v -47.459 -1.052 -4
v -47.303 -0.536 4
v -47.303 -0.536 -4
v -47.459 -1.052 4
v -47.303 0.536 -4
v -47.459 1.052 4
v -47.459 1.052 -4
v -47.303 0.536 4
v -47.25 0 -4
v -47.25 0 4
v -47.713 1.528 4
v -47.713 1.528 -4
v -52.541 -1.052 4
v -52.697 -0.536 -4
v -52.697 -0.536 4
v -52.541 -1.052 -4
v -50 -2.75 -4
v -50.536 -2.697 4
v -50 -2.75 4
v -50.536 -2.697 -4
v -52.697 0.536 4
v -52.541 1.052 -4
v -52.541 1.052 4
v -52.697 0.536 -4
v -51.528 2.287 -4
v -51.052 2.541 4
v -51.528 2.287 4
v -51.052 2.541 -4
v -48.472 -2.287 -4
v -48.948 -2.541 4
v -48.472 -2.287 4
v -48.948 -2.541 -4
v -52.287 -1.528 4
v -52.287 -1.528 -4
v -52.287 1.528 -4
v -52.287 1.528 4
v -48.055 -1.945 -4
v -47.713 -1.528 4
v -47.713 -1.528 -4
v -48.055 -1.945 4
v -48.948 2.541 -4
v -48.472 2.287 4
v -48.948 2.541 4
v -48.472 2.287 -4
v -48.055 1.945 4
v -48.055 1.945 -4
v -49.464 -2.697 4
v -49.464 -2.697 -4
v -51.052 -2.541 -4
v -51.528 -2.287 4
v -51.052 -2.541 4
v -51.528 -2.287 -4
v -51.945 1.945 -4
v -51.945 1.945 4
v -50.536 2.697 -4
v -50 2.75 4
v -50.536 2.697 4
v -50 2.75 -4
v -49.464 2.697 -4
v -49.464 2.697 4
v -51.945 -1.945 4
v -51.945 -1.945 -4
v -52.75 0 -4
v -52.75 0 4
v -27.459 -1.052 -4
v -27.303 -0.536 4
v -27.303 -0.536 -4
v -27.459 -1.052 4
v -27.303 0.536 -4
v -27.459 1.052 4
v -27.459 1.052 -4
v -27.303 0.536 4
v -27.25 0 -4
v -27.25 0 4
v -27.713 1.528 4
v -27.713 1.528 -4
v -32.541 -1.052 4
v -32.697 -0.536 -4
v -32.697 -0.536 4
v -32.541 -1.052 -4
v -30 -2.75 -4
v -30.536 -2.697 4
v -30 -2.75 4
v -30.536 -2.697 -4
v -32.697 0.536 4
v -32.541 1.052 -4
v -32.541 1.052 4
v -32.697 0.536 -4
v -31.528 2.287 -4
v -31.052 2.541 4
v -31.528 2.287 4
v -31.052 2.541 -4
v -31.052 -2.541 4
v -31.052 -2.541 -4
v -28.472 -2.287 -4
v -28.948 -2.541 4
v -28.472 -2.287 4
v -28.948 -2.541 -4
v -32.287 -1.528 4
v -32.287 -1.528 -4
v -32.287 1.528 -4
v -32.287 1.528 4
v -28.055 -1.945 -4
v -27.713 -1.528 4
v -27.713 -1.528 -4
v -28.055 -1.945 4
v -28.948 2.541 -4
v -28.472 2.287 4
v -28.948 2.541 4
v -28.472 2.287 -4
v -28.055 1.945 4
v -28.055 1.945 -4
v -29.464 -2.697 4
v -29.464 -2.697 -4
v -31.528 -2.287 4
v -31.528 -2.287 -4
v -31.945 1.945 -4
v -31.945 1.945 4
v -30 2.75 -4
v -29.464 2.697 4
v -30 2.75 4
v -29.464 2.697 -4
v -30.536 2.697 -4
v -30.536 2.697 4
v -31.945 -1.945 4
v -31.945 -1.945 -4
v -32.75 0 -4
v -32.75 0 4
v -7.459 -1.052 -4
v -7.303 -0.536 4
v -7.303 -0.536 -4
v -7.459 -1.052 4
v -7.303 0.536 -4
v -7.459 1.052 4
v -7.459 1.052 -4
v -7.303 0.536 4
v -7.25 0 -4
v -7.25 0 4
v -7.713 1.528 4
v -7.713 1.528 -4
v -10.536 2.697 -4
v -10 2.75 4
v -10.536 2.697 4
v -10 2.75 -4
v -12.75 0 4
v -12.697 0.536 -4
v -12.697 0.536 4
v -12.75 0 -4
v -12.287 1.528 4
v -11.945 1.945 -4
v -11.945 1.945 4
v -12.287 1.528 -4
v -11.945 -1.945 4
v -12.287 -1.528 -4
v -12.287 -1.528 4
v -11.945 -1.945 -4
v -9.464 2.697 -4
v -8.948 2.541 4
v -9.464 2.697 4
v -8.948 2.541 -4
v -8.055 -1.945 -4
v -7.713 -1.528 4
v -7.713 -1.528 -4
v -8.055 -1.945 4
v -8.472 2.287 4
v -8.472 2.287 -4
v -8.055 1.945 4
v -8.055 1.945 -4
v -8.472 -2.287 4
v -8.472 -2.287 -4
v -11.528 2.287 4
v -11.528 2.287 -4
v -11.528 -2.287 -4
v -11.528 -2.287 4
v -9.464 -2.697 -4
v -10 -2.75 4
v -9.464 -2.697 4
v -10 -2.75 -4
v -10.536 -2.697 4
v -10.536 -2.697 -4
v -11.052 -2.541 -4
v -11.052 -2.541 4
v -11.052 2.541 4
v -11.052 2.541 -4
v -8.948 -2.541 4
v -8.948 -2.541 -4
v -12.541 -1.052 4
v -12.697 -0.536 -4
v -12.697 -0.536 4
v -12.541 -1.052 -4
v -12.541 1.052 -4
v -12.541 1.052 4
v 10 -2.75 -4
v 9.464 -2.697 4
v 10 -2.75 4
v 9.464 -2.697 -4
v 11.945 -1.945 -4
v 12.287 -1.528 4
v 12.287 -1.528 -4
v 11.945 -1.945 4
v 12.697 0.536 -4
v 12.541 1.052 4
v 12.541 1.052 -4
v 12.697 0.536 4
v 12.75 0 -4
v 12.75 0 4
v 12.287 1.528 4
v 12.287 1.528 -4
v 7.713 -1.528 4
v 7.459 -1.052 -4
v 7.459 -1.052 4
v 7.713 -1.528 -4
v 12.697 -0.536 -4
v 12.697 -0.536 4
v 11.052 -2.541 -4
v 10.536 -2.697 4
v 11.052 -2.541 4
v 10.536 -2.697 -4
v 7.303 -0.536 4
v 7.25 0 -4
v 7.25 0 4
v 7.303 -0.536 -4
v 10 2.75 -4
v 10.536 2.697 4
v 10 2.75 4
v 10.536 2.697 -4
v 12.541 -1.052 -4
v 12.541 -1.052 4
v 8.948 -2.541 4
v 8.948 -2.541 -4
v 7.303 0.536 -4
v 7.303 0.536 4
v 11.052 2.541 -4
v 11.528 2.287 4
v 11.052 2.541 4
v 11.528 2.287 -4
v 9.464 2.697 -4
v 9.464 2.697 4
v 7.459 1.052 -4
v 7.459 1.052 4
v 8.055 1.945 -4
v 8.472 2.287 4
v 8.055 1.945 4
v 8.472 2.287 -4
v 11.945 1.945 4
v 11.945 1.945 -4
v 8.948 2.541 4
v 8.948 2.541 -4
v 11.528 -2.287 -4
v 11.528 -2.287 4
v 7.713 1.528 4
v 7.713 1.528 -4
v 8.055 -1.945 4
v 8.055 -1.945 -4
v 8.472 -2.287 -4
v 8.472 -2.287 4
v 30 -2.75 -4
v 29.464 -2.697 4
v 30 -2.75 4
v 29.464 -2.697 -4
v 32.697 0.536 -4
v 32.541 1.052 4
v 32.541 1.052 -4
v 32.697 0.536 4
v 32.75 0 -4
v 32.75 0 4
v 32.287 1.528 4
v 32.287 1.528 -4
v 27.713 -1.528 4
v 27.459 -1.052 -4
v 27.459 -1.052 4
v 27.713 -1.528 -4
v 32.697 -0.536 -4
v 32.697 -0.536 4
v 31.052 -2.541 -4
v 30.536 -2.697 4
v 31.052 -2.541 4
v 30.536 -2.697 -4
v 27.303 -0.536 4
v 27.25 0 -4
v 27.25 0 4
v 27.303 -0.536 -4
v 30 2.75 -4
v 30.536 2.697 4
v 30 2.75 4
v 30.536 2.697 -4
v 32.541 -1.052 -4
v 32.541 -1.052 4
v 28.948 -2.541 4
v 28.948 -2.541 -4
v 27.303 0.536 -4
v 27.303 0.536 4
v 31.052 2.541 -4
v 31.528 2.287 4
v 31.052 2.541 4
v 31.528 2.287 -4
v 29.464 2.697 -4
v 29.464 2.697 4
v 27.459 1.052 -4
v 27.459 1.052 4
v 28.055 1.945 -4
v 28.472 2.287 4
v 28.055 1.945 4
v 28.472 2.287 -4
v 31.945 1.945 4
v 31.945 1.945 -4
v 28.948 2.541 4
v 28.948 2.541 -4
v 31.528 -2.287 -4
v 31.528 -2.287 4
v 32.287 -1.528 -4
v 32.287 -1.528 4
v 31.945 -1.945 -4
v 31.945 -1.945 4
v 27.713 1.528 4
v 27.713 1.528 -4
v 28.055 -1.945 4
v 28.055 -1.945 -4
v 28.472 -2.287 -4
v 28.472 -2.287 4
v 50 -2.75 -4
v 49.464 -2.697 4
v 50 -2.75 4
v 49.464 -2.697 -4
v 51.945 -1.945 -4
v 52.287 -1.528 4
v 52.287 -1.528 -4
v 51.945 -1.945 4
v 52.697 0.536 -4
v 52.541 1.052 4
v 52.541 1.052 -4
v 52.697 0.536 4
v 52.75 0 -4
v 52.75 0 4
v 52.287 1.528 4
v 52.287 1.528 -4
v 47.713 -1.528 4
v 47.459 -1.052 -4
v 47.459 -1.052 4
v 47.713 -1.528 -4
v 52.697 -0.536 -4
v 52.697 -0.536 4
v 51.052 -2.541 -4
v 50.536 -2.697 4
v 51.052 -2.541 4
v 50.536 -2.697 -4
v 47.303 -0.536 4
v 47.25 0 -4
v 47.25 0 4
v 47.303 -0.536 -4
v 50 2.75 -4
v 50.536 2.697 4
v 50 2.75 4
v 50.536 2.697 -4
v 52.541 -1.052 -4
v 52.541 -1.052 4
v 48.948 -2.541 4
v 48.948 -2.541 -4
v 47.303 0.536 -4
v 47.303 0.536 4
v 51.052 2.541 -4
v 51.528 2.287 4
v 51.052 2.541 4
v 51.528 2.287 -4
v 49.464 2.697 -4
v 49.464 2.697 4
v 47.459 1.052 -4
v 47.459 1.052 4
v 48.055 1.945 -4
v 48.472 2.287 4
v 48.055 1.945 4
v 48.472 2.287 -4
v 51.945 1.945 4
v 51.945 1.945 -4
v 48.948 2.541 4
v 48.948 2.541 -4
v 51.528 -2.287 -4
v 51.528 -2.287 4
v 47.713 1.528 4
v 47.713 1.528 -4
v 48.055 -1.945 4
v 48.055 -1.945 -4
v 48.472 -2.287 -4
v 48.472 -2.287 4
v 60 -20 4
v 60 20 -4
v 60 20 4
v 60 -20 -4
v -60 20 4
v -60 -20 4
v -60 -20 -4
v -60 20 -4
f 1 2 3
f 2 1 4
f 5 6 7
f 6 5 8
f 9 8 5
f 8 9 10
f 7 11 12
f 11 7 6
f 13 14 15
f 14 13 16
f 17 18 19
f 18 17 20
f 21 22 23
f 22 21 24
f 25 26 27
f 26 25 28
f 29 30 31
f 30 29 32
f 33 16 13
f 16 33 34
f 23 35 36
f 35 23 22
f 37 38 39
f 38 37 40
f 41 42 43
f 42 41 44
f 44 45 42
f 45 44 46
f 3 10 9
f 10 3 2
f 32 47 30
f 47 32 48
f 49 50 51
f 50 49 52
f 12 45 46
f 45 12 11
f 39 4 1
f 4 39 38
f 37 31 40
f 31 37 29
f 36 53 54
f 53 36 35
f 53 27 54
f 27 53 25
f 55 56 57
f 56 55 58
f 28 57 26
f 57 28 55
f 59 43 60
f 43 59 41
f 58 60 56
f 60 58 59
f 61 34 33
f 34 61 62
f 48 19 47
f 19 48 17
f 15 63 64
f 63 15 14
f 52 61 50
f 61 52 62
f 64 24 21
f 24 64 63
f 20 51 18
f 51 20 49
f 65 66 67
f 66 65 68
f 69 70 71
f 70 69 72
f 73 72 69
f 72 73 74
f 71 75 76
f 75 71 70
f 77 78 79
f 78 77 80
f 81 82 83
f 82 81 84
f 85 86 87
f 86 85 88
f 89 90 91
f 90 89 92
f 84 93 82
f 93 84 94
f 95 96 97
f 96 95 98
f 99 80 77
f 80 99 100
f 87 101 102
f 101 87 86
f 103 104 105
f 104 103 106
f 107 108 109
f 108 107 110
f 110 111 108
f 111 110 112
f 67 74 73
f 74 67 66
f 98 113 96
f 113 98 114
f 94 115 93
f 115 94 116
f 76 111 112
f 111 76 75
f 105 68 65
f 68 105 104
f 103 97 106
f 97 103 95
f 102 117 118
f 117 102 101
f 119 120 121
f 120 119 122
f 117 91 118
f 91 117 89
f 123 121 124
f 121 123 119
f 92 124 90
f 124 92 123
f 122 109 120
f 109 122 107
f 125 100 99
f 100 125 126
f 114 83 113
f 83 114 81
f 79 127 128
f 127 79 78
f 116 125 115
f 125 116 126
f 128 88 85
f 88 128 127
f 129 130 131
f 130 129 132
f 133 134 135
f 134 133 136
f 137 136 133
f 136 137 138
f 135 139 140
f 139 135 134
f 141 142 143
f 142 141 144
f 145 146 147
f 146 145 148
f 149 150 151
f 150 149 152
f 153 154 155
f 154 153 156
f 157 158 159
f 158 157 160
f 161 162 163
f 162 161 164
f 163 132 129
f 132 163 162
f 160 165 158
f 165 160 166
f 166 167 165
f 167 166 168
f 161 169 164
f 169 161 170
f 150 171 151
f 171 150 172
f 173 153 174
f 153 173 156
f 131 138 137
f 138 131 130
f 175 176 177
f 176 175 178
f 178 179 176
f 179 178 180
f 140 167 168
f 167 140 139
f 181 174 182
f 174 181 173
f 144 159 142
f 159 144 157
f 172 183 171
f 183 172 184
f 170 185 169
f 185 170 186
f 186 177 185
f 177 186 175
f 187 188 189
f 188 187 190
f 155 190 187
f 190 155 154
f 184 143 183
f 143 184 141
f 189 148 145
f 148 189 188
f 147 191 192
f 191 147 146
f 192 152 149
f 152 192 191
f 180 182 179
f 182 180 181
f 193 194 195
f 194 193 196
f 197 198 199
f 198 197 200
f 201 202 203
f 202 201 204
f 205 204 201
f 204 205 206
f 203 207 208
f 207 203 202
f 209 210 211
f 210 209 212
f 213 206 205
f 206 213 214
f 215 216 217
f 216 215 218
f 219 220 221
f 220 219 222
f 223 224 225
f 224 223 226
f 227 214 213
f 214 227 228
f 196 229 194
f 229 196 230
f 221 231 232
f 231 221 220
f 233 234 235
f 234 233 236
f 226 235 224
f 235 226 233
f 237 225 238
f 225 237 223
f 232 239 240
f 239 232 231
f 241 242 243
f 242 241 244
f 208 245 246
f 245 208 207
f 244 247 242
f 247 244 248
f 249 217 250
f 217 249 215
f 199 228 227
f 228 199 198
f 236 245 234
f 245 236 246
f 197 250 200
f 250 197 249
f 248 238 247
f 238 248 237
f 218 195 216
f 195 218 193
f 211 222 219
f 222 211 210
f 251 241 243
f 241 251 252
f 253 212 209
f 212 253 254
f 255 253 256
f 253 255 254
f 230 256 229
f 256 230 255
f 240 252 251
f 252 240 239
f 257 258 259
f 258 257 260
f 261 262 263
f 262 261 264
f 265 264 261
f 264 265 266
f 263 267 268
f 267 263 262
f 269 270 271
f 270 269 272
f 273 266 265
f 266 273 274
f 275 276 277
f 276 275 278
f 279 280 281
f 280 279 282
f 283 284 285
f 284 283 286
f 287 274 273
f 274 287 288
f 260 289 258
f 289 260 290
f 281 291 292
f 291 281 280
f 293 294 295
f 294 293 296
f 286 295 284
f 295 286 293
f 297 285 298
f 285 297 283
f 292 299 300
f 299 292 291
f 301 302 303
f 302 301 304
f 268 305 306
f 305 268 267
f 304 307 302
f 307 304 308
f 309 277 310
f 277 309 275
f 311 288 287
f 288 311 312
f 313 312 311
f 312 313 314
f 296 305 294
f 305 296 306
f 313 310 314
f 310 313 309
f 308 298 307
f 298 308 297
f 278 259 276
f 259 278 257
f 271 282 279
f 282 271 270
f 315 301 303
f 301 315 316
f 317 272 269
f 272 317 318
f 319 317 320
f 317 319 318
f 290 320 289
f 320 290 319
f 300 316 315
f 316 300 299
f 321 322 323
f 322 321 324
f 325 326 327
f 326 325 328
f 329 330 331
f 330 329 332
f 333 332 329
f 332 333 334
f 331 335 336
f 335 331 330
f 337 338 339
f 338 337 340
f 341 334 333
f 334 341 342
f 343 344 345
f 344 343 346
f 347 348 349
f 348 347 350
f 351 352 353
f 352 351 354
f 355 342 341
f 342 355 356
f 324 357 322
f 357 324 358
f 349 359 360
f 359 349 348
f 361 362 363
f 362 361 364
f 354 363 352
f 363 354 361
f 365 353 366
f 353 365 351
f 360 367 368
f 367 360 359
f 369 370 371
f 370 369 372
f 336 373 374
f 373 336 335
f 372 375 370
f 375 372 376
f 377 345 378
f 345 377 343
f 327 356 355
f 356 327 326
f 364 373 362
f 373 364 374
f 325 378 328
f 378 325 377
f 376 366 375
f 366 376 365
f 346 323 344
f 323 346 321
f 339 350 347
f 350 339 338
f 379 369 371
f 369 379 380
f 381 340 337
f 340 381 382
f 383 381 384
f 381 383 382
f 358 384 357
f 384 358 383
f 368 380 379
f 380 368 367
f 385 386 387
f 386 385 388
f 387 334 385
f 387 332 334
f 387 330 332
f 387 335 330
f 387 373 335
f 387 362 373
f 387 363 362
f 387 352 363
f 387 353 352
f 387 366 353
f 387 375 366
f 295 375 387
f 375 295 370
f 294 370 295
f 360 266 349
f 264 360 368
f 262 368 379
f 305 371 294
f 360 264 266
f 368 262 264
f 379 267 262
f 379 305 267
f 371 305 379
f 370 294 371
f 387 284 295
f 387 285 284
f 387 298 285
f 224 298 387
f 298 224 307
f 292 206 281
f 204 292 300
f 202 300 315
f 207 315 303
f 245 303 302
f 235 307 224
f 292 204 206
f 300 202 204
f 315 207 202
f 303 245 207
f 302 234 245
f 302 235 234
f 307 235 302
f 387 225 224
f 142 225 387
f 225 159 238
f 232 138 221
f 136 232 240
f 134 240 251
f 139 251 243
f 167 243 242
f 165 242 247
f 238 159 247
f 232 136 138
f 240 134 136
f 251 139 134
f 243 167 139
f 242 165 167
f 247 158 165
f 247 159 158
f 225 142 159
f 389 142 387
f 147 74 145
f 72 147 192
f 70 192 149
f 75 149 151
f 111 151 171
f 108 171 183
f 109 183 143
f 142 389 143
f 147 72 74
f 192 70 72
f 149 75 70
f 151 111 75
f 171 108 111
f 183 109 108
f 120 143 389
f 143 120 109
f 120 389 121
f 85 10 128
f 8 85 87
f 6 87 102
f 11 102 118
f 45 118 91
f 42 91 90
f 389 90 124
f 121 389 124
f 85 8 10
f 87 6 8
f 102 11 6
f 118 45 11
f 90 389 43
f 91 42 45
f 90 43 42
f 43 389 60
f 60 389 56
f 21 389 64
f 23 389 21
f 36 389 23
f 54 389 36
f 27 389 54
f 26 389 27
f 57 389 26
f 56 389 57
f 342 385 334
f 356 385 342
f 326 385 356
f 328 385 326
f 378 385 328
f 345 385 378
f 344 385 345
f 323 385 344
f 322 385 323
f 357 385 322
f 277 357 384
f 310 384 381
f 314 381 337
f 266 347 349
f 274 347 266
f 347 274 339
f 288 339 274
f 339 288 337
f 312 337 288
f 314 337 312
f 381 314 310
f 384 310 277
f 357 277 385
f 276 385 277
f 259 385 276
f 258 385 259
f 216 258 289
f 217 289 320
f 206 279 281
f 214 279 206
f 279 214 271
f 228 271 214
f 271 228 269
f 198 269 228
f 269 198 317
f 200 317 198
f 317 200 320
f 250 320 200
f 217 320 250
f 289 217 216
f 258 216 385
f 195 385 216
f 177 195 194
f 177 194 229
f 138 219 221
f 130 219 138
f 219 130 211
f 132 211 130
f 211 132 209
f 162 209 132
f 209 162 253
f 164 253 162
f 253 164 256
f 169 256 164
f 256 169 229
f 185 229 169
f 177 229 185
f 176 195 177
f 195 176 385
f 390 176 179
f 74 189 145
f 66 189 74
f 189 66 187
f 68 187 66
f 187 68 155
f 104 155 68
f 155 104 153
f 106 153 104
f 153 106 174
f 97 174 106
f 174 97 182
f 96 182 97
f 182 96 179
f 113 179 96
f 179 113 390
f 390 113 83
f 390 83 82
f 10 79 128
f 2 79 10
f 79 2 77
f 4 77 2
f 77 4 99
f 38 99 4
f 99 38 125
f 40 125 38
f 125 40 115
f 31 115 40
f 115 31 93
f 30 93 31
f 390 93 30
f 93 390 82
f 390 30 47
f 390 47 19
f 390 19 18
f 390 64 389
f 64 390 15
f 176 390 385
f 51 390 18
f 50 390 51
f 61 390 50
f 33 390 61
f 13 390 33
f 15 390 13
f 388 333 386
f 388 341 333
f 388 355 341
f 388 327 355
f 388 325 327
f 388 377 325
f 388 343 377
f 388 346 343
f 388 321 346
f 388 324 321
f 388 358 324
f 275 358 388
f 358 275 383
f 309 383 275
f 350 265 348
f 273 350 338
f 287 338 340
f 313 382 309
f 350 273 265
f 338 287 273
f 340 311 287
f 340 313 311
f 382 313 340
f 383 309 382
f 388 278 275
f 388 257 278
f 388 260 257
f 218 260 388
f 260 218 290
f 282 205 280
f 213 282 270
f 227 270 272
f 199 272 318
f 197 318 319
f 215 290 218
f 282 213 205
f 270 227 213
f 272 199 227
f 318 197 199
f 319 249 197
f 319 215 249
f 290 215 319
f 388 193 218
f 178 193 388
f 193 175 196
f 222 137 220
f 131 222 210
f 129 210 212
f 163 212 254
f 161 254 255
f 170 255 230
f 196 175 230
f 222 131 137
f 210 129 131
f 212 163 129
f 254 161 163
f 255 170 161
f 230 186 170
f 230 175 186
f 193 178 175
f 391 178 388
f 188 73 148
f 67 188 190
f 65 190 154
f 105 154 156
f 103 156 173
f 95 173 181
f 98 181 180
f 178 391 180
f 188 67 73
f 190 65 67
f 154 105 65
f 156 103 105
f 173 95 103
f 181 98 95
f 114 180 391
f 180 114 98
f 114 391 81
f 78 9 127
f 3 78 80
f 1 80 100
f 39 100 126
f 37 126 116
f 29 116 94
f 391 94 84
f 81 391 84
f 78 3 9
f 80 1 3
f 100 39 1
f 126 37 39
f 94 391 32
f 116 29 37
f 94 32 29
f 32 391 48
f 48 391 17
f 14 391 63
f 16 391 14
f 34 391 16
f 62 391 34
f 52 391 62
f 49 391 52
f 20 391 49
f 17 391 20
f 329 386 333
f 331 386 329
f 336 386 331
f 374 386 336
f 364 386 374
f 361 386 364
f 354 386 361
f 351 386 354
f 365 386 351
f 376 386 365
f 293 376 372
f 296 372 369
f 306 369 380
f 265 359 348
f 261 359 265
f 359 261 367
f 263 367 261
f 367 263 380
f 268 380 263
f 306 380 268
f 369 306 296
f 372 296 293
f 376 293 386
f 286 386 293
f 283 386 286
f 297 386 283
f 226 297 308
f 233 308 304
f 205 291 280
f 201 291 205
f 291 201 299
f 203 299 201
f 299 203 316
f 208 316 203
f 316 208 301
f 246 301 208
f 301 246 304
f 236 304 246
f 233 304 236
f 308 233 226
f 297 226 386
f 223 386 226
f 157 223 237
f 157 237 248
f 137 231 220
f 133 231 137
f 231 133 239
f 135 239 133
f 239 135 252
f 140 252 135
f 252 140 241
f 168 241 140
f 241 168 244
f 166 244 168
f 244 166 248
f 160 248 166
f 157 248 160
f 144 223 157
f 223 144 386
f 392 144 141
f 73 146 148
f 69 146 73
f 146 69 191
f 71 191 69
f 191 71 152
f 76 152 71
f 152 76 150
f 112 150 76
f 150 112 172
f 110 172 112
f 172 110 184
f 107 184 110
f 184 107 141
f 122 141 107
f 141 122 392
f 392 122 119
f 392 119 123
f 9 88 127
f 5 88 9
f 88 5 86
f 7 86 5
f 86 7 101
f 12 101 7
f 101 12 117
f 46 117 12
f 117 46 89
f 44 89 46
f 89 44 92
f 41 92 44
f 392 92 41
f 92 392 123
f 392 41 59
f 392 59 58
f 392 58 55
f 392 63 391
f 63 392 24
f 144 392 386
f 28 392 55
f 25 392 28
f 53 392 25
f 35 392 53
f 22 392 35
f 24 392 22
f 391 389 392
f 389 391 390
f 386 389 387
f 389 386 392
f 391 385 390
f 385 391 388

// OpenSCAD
$fn = 32;

// ----------------------------------------------------------------------
// Hole bar, 6 x Ø5.5
// row layout, 10 mm edge offset
// ----------------------------------------------------------------------

// --- parameters (mm) ---
bar_w = 40;    // bar width (Y)
bar_t = 8;     // bar thickness (Z)
holes = 6;     // holes per row
hole_d = 5.5;  // hole diameter
edge = 10;     // offset from the bar end to the first hole
pitch = 20;    // pitch between neighbouring holes

// --- derived feature positions (mm) ---
span = (holes - 1) * pitch;   // = 100   distance between the end holes
bar_l = span + 2 * edge;      // = 120   overall bar length
start_x = -bar_l / 2 + edge;  // = -50   X of the first hole
feature_centers = [
  [start_x + 0 * pitch, 0],
  [start_x + 1 * pitch, 0],
  [start_x + 2 * pitch, 0],
  [start_x + 3 * pitch, 0],
  [start_x + 4 * pitch, 0],
  [start_x + 5 * pitch, 0]
];   // hole centres of the first row

// bar with one row of holes, drilled from feature_centers
difference() {
  translate([-bar_l / 2, -bar_w / 2, -bar_t / 2]) cube([bar_l, bar_w, bar_t]);
  for (centre = feature_centers)
    translate([centre[0], centre[1], 0])
      cylinder(d = hole_d, h = bar_t + 2, center = true);
}
